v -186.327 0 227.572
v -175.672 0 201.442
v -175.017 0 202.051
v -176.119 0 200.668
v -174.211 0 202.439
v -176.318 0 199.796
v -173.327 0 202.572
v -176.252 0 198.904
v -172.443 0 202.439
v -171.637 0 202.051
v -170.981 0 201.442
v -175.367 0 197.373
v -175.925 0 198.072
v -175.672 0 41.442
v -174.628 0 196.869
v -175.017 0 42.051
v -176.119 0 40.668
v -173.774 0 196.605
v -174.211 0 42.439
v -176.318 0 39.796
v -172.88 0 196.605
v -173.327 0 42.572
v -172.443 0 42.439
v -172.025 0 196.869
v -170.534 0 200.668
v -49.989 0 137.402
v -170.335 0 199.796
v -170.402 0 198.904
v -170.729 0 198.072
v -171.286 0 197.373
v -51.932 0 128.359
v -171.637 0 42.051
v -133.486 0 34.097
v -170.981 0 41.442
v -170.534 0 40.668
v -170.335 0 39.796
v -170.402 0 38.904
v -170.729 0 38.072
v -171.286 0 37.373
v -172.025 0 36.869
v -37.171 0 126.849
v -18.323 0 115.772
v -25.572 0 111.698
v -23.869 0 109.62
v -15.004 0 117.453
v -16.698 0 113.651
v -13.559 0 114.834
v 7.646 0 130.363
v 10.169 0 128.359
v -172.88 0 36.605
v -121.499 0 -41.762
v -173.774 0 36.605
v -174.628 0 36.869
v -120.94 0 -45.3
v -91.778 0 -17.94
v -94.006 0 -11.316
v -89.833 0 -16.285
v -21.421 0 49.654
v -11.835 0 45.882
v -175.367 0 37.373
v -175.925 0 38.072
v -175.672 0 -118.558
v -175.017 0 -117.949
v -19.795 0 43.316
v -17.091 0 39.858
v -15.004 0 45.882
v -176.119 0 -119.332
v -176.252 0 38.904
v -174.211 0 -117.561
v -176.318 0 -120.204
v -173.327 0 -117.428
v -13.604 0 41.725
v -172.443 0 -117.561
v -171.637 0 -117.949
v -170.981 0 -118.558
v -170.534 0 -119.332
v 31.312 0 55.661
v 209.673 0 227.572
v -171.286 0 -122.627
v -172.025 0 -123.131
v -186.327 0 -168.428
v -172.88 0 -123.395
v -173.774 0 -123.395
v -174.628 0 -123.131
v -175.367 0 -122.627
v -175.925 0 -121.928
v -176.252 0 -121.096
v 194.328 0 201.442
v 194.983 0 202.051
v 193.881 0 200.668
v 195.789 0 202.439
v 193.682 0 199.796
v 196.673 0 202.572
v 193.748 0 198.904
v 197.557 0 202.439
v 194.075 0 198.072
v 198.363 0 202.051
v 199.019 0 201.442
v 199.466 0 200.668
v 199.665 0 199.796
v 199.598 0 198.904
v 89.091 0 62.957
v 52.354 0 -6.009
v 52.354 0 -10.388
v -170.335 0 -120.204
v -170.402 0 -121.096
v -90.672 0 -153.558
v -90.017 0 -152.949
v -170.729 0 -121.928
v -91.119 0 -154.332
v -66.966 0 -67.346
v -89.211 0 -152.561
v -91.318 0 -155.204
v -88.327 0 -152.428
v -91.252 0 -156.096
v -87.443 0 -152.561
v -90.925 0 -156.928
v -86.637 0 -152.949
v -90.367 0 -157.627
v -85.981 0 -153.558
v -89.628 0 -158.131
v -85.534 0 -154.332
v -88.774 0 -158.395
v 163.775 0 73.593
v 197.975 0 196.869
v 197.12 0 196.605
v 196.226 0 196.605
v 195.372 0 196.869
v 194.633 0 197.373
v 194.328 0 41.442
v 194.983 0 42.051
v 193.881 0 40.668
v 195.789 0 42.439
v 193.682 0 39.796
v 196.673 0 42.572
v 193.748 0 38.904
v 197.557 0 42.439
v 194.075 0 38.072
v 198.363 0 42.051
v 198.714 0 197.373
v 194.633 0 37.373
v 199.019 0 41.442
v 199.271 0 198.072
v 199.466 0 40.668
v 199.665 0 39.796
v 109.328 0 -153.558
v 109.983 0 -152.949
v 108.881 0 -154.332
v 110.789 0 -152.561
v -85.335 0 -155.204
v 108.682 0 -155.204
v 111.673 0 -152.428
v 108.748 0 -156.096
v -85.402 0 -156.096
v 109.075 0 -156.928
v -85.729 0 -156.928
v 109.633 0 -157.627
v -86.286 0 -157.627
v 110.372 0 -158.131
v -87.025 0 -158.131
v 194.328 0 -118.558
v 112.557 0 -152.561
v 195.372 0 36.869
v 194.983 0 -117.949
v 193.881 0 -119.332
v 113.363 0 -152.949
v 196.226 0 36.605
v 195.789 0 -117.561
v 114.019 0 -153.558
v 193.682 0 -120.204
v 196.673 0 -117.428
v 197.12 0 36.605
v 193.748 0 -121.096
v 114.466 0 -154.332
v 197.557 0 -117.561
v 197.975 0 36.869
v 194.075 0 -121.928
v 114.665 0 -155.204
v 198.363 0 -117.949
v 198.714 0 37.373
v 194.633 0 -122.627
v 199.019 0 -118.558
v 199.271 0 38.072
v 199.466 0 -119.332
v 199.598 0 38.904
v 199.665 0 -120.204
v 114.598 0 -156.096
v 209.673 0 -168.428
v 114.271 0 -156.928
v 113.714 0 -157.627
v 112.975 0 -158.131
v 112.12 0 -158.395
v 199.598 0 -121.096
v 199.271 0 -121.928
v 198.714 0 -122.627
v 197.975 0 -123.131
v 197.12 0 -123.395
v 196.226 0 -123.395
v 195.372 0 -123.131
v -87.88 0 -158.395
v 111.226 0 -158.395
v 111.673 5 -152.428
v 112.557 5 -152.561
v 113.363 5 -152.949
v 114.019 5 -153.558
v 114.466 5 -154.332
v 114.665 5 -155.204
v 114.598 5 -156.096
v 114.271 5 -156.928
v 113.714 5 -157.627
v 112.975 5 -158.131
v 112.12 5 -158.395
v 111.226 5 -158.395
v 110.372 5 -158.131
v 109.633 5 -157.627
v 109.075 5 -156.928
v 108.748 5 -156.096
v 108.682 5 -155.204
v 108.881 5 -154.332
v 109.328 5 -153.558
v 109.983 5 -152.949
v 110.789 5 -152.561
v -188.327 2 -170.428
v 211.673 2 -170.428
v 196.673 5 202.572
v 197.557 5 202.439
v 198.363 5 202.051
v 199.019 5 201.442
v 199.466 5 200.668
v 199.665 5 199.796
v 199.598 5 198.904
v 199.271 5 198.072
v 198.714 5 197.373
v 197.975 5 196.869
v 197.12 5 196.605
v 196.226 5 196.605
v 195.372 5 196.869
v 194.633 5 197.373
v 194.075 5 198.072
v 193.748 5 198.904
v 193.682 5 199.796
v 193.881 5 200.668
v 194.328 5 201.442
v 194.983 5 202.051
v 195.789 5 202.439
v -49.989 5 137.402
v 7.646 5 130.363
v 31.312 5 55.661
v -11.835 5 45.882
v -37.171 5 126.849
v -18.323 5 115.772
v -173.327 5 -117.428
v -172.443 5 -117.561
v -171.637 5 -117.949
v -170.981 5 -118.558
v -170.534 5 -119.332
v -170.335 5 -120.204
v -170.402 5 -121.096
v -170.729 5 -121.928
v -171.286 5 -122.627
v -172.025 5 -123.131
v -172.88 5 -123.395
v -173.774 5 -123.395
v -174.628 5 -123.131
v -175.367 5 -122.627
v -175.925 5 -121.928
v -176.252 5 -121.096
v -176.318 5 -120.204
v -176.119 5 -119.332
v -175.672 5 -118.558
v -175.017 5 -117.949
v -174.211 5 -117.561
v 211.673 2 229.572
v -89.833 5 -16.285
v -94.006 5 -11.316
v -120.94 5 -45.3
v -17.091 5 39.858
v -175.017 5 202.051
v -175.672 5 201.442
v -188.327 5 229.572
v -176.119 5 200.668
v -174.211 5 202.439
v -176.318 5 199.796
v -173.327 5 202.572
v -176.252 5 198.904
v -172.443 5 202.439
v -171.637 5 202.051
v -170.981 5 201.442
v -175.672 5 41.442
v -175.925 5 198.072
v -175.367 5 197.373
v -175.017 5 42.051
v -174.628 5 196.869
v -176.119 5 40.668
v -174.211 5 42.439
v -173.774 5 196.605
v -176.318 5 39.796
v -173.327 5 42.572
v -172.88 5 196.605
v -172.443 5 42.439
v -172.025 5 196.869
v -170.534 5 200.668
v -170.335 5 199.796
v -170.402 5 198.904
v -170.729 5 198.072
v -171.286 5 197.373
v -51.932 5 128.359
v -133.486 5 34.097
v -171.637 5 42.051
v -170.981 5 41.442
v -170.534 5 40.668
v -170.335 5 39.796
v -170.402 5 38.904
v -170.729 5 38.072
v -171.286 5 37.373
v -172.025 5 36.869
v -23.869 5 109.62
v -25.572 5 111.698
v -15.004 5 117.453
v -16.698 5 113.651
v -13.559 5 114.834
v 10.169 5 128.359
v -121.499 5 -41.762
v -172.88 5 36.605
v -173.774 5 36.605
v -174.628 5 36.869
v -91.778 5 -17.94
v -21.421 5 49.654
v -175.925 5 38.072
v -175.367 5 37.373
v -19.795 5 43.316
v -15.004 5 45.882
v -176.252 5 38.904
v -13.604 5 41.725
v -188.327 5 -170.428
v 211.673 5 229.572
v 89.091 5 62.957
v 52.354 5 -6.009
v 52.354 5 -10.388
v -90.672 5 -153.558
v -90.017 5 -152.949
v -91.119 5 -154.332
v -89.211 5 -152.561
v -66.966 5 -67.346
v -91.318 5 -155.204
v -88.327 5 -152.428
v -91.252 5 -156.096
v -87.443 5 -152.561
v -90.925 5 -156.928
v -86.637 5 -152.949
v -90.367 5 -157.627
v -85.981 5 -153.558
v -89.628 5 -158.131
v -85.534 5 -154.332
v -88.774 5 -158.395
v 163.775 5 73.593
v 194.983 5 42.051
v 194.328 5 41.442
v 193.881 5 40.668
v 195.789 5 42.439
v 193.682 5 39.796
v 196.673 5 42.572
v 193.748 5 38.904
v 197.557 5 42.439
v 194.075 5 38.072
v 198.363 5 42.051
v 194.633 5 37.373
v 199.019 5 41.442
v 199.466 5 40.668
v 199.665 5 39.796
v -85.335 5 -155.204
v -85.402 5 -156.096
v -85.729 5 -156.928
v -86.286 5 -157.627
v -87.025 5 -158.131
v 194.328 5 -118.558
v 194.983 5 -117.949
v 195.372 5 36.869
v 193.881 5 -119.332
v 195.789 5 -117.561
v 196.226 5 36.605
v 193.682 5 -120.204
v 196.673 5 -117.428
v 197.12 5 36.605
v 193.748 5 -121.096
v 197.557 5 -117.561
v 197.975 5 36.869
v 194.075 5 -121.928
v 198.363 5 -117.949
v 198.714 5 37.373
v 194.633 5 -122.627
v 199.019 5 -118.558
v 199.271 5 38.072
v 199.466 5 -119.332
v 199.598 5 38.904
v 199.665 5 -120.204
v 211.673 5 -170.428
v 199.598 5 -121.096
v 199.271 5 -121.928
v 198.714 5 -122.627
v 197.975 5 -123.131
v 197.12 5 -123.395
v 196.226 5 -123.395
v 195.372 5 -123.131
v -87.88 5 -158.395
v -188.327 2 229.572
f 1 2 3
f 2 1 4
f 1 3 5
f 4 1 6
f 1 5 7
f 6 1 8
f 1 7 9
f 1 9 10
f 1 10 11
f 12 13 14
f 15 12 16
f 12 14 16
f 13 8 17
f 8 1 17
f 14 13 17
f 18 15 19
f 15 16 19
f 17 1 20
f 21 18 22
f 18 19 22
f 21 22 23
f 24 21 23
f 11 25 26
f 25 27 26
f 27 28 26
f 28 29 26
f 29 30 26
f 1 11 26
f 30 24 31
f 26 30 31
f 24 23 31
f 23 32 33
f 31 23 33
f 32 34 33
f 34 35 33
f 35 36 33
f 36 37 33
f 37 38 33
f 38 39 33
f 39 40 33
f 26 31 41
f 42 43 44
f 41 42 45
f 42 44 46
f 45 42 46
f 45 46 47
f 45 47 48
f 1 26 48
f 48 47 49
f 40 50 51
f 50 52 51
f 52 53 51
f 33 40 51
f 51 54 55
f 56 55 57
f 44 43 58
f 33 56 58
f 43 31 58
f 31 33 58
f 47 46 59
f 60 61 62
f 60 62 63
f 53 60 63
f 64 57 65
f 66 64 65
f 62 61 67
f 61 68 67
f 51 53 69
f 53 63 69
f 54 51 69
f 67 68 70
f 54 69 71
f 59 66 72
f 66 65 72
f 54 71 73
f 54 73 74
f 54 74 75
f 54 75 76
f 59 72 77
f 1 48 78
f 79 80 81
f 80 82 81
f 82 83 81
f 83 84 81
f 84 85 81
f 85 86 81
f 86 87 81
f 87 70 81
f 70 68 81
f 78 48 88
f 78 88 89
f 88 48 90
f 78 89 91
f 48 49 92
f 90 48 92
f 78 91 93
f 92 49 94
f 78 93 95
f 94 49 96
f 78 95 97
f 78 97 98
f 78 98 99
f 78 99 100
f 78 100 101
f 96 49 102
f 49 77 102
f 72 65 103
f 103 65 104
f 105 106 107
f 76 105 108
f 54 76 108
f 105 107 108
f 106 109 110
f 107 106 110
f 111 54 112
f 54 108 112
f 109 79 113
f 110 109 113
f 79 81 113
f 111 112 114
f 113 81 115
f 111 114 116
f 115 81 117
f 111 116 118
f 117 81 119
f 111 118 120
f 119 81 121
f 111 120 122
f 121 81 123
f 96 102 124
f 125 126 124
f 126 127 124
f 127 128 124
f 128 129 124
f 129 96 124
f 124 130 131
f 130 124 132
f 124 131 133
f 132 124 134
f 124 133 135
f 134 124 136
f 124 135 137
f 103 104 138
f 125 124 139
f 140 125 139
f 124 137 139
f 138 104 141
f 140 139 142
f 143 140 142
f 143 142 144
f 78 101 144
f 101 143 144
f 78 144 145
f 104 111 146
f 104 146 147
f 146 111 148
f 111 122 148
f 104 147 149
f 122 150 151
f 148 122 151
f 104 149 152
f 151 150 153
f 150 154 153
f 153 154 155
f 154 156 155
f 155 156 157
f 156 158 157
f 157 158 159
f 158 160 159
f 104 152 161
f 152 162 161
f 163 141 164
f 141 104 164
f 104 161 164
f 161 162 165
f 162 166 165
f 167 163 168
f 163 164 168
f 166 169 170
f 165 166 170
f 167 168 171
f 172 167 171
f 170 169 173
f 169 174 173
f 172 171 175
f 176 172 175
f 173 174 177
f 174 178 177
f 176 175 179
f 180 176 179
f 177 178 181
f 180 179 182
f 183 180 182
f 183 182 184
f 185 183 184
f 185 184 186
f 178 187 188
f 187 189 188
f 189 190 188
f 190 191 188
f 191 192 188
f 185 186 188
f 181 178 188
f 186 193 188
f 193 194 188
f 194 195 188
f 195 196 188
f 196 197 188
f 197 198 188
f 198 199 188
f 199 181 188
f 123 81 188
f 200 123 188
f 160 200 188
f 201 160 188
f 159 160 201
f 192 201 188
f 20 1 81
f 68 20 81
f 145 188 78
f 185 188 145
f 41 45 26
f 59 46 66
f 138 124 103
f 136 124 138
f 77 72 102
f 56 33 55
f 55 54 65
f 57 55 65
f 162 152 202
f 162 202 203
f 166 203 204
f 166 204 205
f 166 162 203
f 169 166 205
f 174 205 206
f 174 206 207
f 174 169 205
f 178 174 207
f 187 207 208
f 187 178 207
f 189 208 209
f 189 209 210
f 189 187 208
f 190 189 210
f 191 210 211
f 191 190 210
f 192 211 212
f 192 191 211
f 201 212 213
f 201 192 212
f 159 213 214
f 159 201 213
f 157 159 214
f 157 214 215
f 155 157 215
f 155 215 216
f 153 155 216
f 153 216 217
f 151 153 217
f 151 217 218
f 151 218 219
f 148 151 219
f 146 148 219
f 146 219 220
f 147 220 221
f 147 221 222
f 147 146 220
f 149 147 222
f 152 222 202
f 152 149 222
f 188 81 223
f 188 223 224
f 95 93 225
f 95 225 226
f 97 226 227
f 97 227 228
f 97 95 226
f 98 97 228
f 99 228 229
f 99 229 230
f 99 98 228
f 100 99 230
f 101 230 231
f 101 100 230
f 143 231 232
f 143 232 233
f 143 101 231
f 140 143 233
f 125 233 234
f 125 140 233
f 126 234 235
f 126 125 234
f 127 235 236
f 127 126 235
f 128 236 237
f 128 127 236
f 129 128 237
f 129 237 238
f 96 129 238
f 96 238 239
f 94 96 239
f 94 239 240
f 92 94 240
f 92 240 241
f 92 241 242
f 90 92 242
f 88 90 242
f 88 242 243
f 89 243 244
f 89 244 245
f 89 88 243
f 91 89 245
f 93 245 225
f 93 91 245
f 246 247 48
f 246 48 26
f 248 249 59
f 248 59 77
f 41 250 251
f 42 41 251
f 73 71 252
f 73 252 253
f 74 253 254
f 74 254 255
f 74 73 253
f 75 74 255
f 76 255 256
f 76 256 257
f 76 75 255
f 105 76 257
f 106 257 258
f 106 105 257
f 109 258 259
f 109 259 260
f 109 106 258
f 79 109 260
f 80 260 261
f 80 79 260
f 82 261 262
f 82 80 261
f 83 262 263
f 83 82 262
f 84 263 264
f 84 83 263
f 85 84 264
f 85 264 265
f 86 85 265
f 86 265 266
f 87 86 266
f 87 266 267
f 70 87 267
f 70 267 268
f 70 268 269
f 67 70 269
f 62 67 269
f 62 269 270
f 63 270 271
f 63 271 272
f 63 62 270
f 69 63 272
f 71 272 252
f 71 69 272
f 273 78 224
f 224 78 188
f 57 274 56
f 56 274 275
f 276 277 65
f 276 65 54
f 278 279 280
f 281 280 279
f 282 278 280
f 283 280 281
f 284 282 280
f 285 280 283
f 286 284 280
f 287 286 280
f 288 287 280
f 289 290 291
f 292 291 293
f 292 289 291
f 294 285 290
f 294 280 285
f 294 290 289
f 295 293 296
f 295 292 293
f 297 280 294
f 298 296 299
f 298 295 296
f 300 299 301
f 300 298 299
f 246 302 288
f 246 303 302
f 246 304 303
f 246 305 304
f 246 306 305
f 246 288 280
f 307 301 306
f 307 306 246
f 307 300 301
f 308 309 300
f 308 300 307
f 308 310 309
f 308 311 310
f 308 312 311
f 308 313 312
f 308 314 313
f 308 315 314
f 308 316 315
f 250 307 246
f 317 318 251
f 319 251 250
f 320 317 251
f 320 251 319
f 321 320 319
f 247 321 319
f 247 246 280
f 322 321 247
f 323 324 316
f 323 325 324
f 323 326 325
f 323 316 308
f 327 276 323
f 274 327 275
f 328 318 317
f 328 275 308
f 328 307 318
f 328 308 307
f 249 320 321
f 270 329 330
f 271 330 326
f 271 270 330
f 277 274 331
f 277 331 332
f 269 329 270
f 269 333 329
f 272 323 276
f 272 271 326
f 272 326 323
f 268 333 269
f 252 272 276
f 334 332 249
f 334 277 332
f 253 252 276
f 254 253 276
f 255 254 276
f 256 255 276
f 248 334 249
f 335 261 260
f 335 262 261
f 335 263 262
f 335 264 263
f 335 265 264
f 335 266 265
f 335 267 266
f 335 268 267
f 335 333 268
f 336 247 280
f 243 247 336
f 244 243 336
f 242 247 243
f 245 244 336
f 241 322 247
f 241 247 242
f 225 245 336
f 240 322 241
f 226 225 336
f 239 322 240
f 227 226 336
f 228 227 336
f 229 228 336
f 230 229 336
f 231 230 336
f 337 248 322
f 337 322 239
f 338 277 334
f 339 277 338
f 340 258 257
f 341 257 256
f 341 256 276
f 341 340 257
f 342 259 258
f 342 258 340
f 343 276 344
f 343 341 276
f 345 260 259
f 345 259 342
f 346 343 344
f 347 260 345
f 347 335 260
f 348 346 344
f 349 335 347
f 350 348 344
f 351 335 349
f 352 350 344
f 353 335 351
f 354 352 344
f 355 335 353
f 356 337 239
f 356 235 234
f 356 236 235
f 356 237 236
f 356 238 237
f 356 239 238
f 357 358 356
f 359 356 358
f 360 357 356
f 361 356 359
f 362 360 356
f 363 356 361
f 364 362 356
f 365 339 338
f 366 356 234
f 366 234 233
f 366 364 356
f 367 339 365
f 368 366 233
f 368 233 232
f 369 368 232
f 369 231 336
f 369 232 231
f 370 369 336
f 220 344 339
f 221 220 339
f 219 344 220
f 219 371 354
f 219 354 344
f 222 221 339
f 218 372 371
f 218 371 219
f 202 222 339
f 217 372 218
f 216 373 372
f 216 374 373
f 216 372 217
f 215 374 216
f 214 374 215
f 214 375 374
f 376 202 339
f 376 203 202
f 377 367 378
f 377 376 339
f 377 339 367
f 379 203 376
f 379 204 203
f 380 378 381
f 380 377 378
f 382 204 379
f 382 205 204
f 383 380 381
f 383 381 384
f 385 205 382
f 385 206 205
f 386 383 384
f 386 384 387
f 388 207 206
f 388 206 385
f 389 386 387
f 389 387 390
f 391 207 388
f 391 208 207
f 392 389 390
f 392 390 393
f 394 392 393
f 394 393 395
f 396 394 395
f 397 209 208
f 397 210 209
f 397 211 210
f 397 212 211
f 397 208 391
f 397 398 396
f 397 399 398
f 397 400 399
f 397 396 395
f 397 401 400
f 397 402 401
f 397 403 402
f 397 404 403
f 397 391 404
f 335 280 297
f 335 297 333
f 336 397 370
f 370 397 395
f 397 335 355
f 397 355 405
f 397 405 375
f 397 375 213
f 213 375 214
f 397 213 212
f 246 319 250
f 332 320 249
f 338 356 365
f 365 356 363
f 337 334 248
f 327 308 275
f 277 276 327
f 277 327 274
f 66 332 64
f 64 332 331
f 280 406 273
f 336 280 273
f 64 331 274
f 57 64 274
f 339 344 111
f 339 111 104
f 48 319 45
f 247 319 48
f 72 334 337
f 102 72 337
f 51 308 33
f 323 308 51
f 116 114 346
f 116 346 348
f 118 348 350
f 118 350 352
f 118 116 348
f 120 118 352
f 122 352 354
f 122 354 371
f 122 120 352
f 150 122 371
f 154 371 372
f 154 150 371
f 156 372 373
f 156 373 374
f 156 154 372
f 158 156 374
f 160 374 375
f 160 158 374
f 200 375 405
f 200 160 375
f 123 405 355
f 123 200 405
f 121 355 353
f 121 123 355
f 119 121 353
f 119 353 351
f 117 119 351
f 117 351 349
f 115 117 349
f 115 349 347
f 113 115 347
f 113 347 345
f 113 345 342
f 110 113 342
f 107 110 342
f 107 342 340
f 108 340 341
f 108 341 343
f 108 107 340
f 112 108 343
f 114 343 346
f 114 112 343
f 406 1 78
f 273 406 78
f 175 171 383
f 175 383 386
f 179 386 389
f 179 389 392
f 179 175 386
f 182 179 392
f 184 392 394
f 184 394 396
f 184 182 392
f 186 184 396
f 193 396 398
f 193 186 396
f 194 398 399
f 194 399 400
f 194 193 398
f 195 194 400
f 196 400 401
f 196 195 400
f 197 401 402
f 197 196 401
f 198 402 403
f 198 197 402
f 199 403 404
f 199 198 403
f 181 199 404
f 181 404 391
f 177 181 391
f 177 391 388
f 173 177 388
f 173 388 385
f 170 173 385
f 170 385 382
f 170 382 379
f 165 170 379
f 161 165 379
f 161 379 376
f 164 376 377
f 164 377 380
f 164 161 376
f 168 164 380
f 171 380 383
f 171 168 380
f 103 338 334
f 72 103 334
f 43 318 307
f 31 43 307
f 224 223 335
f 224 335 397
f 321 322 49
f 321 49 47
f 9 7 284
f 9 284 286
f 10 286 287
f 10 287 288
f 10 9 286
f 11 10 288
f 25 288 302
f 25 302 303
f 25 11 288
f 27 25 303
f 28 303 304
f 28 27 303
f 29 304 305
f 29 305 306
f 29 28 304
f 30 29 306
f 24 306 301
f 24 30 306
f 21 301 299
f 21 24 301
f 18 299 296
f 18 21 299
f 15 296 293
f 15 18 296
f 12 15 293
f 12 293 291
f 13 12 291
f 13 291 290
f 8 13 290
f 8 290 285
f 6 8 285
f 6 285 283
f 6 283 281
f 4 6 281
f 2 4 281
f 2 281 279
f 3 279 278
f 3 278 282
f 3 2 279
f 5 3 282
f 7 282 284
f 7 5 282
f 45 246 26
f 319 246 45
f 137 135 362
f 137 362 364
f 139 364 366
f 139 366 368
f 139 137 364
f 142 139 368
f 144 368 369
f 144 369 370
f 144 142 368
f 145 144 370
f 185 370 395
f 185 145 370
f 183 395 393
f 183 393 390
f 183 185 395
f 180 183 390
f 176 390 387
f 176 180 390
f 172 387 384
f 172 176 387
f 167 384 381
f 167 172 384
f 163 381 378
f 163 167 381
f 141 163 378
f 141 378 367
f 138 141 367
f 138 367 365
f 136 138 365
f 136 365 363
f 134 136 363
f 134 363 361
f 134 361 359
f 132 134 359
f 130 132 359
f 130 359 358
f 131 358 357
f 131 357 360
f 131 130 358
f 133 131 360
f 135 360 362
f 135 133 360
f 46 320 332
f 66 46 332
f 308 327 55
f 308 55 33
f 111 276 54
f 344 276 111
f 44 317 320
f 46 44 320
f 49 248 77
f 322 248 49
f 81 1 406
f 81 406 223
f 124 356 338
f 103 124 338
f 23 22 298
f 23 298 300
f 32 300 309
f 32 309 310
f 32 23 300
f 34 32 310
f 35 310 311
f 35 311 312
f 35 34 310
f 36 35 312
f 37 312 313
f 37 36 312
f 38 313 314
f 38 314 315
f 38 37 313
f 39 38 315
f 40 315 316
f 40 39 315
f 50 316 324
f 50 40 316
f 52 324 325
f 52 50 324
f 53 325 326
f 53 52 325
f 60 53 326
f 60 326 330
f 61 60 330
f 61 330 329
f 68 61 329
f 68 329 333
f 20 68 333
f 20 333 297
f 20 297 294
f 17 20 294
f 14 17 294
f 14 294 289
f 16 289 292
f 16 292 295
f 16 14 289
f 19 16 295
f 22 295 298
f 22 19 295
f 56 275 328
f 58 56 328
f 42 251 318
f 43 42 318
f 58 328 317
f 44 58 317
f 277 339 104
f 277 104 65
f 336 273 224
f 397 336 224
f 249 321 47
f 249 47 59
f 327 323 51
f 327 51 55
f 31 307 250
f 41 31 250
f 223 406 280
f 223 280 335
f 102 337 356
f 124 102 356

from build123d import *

# Parameters (mm, degrees)
CROQUIS1_W              = 400
CROQUIS1_H              = 400
CROQUIS1_R              = 3
SALIENTE_EXTRUIR1_DEPTH = 5
CHAFL_N1_SIZE           = 2
CORTAR_EXTRUIR1_DEPTH   = 10


with BuildPart() as part:
    # Croquis1 → Saliente-Extruir1 (new body)
    with BuildSketch(Plane(origin=(0, 0, 0), x_dir=(1, 0, 0), z_dir=(0, 1, 0))):
        with Locations((11.673151751, -29.571984436)):
            Rectangle(CROQUIS1_W, CROQUIS1_H)
        with Locations(Location((-173.326848249, 120.428015564, 0), (0, 0, 270))):
            Circle(CROQUIS1_R, mode=Mode.SUBTRACT)
        with Locations(Location((-173.326848249, -199.571984436, 0), (0, 0, 270))):
            Circle(CROQUIS1_R, mode=Mode.SUBTRACT)
        with Locations(Location((196.673151751, -199.571984436, 0), (0, 0, 270))):
            Circle(CROQUIS1_R, mode=Mode.SUBTRACT)
        with Locations(Location((196.673151751, 120.428015564, 0), (0, 0, 270))):
            Circle(CROQUIS1_R, mode=Mode.SUBTRACT)
        with Locations(Location((-173.326848249, -39.571984436, 0), (0, 0, 270))):
            Circle(CROQUIS1_R, mode=Mode.SUBTRACT)
        with Locations(Location((196.673151751, -39.571984436, 0), (0, 0, 270))):
            Circle(CROQUIS1_R, mode=Mode.SUBTRACT)
        with Locations(Location((-88.326848249, 155.428015564, 0), (0, 0, 270))):
            Circle(CROQUIS1_R, mode=Mode.SUBTRACT)
        with Locations(Location((111.673151751, 155.428015564, 0), (0, 0, 270))):
            Circle(CROQUIS1_R, mode=Mode.SUBTRACT)
    extrude(amount=SALIENTE_EXTRUIR1_DEPTH)

    # Chaflán1
    chafl_n1_edges = [part.edges().sort_by_distance(p)[0] for p in [
        (11.673151751, 0, -170.428015564),
        (211.673151751, 0, 29.571984436),
        (11.673151751, 0, 229.571984436),
        (-188.326848249, 0, 29.571984436),
    ]]
    chamfer(chafl_n1_edges, length=CHAFL_N1_SIZE)

    # Croquis2 → Cortar-Extruir1 (cut)
    with BuildSketch(Plane(origin=(0, 5, 0), x_dir=(1, 0, 0), z_dir=(0, 1, 0))):
        Polygon((-91.777504567, 17.93962644), (-133.486350664, -34.097124404), (-121.499339941, 41.762471587), align=None)
        Polygon((-120.940367697, 45.29991804), (-66.966286679, 67.345973172), (52.354078092, 10.388168385), (-17.091461921, -39.85772233), align=None)
        Polygon((163.775185266, -73.593412395), (52.354078092, 6.009139456), (-13.604376997, -41.724802745), (89.090925469, -62.956955386), align=None)
        Polygon((31.311804468, -55.660536224), (10.169460209, -128.358580052), (-13.558867473, -114.834434958), (-11.835173214, -45.882080038), align=None)
        Polygon((7.646392173, -130.362582514), (-49.989323249, -137.40209781), (-15.003820451, -117.452917491), align=None)
        Polygon((-94.005890503, 11.316220426), (-21.421222894, -49.654322149), (-23.868784692, -109.619586204), (-16.697922209, -113.650656174), (-15.003820451, -45.882080038), (-19.79537186, -43.31560542), (-89.832558674, 16.28451972), align=None)
        Polygon((-25.572304789, -111.697520158), (-51.931593577, -128.358580052), (-37.17095608, -126.84931671), (-18.323489891, -115.772410748), align=None)
    extrude(amount=-CORTAR_EXTRUIR1_DEPTH, mode=Mode.SUBTRACT)


solid = part.part
